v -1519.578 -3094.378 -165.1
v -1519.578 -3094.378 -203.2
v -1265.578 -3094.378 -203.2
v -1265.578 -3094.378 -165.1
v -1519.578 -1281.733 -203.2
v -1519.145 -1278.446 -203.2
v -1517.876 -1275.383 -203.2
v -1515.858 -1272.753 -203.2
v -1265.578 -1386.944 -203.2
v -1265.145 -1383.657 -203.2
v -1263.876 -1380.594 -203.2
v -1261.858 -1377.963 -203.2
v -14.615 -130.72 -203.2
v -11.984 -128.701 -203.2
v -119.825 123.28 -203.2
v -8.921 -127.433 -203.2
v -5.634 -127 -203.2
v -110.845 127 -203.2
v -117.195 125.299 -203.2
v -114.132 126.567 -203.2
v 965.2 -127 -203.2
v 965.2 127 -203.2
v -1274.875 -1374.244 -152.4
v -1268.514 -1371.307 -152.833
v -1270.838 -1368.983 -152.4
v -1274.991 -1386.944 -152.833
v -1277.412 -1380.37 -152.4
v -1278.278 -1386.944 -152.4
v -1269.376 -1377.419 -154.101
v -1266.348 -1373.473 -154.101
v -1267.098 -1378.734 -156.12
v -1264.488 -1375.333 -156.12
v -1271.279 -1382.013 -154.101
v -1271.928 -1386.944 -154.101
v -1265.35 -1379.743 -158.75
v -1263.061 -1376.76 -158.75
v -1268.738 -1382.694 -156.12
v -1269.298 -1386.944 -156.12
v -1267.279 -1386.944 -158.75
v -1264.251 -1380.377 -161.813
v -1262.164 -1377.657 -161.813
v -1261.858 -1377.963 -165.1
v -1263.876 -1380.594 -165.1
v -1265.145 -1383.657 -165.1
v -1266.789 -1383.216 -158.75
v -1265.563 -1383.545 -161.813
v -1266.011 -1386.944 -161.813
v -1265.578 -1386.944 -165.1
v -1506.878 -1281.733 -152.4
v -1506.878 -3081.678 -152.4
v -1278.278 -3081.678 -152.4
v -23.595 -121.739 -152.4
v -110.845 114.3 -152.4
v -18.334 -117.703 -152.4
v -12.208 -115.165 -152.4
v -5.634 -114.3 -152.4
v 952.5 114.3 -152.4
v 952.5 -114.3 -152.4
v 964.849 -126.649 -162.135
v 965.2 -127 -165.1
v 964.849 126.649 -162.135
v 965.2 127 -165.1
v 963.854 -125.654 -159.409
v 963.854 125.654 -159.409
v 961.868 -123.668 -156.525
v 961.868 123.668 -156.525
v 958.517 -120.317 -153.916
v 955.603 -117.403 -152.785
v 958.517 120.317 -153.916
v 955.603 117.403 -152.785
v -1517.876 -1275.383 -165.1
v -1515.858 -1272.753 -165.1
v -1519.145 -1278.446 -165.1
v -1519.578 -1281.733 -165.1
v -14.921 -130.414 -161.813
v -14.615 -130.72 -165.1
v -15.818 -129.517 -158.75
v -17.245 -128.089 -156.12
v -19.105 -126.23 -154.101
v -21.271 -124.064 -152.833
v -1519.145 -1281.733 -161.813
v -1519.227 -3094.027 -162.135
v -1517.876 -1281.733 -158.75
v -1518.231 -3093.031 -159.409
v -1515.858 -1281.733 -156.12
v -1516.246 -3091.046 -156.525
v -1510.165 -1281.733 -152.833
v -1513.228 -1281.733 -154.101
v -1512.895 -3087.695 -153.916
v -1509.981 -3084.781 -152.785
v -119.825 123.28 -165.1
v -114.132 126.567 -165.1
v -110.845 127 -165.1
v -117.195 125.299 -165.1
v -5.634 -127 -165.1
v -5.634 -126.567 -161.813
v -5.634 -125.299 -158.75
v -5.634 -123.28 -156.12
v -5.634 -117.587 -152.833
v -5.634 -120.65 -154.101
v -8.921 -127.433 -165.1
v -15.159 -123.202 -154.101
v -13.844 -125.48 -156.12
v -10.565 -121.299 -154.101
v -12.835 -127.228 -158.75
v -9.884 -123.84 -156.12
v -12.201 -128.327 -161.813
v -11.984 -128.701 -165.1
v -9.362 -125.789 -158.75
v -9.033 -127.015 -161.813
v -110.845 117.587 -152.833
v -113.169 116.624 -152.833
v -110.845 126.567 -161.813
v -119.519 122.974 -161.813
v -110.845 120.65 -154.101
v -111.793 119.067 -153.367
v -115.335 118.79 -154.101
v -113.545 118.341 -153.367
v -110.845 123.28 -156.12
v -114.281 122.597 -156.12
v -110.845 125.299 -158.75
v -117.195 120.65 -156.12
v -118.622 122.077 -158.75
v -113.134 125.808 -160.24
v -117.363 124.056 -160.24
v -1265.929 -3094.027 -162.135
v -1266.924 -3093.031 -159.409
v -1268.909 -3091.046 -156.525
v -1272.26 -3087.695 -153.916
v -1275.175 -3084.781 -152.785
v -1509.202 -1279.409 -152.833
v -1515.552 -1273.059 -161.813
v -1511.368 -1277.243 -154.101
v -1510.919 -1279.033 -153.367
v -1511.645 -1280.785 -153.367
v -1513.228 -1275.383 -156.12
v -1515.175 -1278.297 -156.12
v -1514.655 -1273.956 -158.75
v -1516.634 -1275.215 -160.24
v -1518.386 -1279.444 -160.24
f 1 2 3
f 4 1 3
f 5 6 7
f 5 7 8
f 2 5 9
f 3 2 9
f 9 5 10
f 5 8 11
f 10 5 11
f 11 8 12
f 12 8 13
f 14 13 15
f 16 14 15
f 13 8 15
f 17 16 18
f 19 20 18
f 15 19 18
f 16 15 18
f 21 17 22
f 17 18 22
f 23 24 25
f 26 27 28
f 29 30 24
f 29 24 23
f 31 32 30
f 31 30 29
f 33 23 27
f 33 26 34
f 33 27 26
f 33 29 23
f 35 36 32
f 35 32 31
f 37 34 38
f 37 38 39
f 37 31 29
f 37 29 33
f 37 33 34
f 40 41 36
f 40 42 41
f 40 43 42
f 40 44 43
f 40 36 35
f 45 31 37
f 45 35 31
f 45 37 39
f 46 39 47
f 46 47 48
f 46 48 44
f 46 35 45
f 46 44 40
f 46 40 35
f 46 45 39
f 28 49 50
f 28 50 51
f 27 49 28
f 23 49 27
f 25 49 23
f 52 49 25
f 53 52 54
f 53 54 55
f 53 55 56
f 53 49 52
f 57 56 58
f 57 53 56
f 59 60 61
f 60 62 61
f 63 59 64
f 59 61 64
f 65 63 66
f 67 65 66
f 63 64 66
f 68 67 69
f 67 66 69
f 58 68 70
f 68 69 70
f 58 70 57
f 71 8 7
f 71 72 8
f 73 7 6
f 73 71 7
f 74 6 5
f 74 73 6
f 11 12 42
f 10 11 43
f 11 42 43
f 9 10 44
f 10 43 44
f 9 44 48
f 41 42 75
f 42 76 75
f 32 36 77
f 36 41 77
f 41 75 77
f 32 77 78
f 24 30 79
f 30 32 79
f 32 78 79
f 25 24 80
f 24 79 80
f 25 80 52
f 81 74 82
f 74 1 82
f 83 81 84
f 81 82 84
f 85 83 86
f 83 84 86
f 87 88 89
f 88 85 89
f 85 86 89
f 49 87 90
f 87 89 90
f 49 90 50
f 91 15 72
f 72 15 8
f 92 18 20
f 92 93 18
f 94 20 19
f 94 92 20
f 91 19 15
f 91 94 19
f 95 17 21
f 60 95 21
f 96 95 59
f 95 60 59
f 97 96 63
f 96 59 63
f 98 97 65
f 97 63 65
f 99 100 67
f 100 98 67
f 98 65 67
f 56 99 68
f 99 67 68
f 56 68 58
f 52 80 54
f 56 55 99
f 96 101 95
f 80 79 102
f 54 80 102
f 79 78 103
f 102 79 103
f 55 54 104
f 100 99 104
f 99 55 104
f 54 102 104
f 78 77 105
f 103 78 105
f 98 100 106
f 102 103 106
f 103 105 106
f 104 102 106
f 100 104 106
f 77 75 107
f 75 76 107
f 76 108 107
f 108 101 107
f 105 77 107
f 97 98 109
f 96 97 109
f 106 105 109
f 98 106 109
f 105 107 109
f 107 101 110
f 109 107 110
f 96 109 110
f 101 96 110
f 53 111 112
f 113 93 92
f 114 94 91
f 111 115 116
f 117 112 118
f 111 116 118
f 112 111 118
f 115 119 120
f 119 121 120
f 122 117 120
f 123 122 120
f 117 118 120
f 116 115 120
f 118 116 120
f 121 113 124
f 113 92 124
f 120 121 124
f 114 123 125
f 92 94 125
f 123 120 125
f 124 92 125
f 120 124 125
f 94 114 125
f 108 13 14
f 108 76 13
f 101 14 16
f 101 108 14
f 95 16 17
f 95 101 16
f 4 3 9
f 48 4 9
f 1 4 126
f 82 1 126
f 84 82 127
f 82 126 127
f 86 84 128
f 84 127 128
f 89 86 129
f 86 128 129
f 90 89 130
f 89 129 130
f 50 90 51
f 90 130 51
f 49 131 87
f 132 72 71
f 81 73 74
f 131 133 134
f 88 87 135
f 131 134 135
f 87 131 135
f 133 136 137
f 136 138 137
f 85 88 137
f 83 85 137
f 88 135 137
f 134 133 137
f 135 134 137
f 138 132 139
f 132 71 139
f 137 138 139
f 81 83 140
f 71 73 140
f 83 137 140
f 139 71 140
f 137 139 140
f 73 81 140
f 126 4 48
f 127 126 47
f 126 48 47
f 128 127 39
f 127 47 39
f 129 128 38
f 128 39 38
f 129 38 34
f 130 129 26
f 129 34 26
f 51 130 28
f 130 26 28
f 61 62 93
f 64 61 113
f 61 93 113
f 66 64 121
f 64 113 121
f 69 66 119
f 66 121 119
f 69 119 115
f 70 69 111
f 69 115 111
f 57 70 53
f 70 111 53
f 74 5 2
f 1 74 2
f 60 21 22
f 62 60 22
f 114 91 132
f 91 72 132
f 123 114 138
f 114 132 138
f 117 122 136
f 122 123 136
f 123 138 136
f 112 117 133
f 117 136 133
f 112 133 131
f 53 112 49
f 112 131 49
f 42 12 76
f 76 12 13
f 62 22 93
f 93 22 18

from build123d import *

# Parameters (mm, degrees)
F1_DEPTH = 50.8
F2_R     = 12.7


with BuildPart() as f1:
    # F0 (on Top) → F1 (new body)
    with BuildSketch(Plane.XY):
        Polygon((-1202.077906, -1381.683028), (52.605122, -127), (1028.7, -127), (1028.7, 127), (0, 127), (-52.605122, 127), (-1456.077906, -1276.472783), (-1456.077906, -1329.077906), (-1456.077906, -3094.377906), (-1202.077906, -3094.377906), align=None)
    extrude(amount=F1_DEPTH)

    # F2
    f2_edges = [f1.edges().sort_by_distance(p)[0] for p in [
        (-574.736392, -754.341514, 50.8),
        (540.652561, -127, 50.8),
        (1028.7, 0, 50.8),
        (488.047439, 127, 50.8),
        (-754.341514, -574.736392, 50.8),
        (-1456.077906, -2185.425345, 50.8),
        (-1329.077906, -3094.377906, 50.8),
        (-1202.077906, -2238.030467, 50.8),
        (-1456.077906, -1276.472783, 25.4),
        (-52.605122, 127, 25.4),
        (52.605122, -127, 25.4),
        (-1202.077906, -1381.683028, 25.4),
    ]]
    fillet(f2_edges, radius=F2_R)


with BuildPart() as f1_1:
    # F3: moved
    add(f1.part.moved(Location((-63.5, 0, -203.2))))


solid = f1_1.part
